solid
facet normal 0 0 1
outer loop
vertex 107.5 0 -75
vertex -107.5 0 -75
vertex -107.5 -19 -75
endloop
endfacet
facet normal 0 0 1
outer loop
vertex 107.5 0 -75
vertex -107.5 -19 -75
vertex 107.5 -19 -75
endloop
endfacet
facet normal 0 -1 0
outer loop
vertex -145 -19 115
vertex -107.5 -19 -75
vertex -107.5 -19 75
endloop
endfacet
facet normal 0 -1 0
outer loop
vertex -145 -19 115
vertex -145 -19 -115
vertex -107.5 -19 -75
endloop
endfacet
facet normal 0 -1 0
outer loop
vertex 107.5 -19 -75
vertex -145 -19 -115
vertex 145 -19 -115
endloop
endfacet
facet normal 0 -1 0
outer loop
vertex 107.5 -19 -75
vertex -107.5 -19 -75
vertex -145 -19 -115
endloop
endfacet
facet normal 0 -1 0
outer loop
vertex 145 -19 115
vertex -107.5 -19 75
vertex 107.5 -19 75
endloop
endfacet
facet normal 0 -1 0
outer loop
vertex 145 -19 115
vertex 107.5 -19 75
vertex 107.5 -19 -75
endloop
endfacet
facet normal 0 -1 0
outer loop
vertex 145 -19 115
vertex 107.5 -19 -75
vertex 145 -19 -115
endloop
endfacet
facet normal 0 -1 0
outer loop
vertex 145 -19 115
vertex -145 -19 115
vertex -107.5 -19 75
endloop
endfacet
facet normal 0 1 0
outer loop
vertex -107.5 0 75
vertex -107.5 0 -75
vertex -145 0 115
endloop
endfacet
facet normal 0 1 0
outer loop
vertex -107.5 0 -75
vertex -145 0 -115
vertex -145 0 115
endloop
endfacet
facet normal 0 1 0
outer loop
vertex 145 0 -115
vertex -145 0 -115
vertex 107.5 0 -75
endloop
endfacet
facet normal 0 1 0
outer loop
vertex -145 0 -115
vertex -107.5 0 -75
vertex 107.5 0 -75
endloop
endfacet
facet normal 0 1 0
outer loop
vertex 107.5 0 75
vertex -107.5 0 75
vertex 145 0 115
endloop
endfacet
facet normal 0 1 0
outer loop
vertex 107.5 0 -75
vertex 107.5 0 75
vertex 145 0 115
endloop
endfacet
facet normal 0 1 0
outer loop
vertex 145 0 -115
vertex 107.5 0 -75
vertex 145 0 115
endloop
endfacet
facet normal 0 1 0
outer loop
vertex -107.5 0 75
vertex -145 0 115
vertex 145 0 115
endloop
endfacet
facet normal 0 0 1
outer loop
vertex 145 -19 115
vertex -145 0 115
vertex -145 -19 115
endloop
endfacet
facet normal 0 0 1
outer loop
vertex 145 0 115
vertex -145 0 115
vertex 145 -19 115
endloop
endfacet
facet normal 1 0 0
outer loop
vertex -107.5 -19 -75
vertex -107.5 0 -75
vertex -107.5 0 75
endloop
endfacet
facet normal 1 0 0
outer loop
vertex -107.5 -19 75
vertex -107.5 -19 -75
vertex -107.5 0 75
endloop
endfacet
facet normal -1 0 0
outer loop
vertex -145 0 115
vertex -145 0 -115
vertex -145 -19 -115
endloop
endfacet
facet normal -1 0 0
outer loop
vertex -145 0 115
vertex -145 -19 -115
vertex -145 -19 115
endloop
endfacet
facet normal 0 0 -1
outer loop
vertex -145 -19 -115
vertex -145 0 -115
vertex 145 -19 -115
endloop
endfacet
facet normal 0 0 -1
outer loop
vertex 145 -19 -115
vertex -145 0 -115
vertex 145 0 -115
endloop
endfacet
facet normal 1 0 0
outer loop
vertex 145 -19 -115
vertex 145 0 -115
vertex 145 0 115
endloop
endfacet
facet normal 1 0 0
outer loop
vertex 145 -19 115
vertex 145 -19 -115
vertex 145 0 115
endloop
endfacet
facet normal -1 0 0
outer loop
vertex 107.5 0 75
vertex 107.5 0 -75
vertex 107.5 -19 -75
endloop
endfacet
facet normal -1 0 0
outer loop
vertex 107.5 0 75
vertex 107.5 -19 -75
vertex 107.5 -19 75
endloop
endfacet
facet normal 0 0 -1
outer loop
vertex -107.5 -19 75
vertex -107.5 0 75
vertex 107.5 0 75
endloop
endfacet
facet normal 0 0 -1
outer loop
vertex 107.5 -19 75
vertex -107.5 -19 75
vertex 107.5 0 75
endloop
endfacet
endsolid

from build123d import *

# Parameters (mm, degrees)
F0_W     = 290
F0_H     = 230
F2_DEPTH = 19
F1_W     = 215
F1_H     = 150
F3_DEPTH = 25


with BuildPart() as f2:
    # F0 (on Front) → F2 (new body)
    with BuildSketch(Plane.XZ):
        Rectangle(F0_W, F0_H)
    extrude(amount=F2_DEPTH)

    # F1 (on face) → F3 (cut)
    with BuildSketch(Plane.XZ):
        Rectangle(F1_W, F1_H)
    extrude(amount=F3_DEPTH, mode=Mode.SUBTRACT)


solid = f2.part
